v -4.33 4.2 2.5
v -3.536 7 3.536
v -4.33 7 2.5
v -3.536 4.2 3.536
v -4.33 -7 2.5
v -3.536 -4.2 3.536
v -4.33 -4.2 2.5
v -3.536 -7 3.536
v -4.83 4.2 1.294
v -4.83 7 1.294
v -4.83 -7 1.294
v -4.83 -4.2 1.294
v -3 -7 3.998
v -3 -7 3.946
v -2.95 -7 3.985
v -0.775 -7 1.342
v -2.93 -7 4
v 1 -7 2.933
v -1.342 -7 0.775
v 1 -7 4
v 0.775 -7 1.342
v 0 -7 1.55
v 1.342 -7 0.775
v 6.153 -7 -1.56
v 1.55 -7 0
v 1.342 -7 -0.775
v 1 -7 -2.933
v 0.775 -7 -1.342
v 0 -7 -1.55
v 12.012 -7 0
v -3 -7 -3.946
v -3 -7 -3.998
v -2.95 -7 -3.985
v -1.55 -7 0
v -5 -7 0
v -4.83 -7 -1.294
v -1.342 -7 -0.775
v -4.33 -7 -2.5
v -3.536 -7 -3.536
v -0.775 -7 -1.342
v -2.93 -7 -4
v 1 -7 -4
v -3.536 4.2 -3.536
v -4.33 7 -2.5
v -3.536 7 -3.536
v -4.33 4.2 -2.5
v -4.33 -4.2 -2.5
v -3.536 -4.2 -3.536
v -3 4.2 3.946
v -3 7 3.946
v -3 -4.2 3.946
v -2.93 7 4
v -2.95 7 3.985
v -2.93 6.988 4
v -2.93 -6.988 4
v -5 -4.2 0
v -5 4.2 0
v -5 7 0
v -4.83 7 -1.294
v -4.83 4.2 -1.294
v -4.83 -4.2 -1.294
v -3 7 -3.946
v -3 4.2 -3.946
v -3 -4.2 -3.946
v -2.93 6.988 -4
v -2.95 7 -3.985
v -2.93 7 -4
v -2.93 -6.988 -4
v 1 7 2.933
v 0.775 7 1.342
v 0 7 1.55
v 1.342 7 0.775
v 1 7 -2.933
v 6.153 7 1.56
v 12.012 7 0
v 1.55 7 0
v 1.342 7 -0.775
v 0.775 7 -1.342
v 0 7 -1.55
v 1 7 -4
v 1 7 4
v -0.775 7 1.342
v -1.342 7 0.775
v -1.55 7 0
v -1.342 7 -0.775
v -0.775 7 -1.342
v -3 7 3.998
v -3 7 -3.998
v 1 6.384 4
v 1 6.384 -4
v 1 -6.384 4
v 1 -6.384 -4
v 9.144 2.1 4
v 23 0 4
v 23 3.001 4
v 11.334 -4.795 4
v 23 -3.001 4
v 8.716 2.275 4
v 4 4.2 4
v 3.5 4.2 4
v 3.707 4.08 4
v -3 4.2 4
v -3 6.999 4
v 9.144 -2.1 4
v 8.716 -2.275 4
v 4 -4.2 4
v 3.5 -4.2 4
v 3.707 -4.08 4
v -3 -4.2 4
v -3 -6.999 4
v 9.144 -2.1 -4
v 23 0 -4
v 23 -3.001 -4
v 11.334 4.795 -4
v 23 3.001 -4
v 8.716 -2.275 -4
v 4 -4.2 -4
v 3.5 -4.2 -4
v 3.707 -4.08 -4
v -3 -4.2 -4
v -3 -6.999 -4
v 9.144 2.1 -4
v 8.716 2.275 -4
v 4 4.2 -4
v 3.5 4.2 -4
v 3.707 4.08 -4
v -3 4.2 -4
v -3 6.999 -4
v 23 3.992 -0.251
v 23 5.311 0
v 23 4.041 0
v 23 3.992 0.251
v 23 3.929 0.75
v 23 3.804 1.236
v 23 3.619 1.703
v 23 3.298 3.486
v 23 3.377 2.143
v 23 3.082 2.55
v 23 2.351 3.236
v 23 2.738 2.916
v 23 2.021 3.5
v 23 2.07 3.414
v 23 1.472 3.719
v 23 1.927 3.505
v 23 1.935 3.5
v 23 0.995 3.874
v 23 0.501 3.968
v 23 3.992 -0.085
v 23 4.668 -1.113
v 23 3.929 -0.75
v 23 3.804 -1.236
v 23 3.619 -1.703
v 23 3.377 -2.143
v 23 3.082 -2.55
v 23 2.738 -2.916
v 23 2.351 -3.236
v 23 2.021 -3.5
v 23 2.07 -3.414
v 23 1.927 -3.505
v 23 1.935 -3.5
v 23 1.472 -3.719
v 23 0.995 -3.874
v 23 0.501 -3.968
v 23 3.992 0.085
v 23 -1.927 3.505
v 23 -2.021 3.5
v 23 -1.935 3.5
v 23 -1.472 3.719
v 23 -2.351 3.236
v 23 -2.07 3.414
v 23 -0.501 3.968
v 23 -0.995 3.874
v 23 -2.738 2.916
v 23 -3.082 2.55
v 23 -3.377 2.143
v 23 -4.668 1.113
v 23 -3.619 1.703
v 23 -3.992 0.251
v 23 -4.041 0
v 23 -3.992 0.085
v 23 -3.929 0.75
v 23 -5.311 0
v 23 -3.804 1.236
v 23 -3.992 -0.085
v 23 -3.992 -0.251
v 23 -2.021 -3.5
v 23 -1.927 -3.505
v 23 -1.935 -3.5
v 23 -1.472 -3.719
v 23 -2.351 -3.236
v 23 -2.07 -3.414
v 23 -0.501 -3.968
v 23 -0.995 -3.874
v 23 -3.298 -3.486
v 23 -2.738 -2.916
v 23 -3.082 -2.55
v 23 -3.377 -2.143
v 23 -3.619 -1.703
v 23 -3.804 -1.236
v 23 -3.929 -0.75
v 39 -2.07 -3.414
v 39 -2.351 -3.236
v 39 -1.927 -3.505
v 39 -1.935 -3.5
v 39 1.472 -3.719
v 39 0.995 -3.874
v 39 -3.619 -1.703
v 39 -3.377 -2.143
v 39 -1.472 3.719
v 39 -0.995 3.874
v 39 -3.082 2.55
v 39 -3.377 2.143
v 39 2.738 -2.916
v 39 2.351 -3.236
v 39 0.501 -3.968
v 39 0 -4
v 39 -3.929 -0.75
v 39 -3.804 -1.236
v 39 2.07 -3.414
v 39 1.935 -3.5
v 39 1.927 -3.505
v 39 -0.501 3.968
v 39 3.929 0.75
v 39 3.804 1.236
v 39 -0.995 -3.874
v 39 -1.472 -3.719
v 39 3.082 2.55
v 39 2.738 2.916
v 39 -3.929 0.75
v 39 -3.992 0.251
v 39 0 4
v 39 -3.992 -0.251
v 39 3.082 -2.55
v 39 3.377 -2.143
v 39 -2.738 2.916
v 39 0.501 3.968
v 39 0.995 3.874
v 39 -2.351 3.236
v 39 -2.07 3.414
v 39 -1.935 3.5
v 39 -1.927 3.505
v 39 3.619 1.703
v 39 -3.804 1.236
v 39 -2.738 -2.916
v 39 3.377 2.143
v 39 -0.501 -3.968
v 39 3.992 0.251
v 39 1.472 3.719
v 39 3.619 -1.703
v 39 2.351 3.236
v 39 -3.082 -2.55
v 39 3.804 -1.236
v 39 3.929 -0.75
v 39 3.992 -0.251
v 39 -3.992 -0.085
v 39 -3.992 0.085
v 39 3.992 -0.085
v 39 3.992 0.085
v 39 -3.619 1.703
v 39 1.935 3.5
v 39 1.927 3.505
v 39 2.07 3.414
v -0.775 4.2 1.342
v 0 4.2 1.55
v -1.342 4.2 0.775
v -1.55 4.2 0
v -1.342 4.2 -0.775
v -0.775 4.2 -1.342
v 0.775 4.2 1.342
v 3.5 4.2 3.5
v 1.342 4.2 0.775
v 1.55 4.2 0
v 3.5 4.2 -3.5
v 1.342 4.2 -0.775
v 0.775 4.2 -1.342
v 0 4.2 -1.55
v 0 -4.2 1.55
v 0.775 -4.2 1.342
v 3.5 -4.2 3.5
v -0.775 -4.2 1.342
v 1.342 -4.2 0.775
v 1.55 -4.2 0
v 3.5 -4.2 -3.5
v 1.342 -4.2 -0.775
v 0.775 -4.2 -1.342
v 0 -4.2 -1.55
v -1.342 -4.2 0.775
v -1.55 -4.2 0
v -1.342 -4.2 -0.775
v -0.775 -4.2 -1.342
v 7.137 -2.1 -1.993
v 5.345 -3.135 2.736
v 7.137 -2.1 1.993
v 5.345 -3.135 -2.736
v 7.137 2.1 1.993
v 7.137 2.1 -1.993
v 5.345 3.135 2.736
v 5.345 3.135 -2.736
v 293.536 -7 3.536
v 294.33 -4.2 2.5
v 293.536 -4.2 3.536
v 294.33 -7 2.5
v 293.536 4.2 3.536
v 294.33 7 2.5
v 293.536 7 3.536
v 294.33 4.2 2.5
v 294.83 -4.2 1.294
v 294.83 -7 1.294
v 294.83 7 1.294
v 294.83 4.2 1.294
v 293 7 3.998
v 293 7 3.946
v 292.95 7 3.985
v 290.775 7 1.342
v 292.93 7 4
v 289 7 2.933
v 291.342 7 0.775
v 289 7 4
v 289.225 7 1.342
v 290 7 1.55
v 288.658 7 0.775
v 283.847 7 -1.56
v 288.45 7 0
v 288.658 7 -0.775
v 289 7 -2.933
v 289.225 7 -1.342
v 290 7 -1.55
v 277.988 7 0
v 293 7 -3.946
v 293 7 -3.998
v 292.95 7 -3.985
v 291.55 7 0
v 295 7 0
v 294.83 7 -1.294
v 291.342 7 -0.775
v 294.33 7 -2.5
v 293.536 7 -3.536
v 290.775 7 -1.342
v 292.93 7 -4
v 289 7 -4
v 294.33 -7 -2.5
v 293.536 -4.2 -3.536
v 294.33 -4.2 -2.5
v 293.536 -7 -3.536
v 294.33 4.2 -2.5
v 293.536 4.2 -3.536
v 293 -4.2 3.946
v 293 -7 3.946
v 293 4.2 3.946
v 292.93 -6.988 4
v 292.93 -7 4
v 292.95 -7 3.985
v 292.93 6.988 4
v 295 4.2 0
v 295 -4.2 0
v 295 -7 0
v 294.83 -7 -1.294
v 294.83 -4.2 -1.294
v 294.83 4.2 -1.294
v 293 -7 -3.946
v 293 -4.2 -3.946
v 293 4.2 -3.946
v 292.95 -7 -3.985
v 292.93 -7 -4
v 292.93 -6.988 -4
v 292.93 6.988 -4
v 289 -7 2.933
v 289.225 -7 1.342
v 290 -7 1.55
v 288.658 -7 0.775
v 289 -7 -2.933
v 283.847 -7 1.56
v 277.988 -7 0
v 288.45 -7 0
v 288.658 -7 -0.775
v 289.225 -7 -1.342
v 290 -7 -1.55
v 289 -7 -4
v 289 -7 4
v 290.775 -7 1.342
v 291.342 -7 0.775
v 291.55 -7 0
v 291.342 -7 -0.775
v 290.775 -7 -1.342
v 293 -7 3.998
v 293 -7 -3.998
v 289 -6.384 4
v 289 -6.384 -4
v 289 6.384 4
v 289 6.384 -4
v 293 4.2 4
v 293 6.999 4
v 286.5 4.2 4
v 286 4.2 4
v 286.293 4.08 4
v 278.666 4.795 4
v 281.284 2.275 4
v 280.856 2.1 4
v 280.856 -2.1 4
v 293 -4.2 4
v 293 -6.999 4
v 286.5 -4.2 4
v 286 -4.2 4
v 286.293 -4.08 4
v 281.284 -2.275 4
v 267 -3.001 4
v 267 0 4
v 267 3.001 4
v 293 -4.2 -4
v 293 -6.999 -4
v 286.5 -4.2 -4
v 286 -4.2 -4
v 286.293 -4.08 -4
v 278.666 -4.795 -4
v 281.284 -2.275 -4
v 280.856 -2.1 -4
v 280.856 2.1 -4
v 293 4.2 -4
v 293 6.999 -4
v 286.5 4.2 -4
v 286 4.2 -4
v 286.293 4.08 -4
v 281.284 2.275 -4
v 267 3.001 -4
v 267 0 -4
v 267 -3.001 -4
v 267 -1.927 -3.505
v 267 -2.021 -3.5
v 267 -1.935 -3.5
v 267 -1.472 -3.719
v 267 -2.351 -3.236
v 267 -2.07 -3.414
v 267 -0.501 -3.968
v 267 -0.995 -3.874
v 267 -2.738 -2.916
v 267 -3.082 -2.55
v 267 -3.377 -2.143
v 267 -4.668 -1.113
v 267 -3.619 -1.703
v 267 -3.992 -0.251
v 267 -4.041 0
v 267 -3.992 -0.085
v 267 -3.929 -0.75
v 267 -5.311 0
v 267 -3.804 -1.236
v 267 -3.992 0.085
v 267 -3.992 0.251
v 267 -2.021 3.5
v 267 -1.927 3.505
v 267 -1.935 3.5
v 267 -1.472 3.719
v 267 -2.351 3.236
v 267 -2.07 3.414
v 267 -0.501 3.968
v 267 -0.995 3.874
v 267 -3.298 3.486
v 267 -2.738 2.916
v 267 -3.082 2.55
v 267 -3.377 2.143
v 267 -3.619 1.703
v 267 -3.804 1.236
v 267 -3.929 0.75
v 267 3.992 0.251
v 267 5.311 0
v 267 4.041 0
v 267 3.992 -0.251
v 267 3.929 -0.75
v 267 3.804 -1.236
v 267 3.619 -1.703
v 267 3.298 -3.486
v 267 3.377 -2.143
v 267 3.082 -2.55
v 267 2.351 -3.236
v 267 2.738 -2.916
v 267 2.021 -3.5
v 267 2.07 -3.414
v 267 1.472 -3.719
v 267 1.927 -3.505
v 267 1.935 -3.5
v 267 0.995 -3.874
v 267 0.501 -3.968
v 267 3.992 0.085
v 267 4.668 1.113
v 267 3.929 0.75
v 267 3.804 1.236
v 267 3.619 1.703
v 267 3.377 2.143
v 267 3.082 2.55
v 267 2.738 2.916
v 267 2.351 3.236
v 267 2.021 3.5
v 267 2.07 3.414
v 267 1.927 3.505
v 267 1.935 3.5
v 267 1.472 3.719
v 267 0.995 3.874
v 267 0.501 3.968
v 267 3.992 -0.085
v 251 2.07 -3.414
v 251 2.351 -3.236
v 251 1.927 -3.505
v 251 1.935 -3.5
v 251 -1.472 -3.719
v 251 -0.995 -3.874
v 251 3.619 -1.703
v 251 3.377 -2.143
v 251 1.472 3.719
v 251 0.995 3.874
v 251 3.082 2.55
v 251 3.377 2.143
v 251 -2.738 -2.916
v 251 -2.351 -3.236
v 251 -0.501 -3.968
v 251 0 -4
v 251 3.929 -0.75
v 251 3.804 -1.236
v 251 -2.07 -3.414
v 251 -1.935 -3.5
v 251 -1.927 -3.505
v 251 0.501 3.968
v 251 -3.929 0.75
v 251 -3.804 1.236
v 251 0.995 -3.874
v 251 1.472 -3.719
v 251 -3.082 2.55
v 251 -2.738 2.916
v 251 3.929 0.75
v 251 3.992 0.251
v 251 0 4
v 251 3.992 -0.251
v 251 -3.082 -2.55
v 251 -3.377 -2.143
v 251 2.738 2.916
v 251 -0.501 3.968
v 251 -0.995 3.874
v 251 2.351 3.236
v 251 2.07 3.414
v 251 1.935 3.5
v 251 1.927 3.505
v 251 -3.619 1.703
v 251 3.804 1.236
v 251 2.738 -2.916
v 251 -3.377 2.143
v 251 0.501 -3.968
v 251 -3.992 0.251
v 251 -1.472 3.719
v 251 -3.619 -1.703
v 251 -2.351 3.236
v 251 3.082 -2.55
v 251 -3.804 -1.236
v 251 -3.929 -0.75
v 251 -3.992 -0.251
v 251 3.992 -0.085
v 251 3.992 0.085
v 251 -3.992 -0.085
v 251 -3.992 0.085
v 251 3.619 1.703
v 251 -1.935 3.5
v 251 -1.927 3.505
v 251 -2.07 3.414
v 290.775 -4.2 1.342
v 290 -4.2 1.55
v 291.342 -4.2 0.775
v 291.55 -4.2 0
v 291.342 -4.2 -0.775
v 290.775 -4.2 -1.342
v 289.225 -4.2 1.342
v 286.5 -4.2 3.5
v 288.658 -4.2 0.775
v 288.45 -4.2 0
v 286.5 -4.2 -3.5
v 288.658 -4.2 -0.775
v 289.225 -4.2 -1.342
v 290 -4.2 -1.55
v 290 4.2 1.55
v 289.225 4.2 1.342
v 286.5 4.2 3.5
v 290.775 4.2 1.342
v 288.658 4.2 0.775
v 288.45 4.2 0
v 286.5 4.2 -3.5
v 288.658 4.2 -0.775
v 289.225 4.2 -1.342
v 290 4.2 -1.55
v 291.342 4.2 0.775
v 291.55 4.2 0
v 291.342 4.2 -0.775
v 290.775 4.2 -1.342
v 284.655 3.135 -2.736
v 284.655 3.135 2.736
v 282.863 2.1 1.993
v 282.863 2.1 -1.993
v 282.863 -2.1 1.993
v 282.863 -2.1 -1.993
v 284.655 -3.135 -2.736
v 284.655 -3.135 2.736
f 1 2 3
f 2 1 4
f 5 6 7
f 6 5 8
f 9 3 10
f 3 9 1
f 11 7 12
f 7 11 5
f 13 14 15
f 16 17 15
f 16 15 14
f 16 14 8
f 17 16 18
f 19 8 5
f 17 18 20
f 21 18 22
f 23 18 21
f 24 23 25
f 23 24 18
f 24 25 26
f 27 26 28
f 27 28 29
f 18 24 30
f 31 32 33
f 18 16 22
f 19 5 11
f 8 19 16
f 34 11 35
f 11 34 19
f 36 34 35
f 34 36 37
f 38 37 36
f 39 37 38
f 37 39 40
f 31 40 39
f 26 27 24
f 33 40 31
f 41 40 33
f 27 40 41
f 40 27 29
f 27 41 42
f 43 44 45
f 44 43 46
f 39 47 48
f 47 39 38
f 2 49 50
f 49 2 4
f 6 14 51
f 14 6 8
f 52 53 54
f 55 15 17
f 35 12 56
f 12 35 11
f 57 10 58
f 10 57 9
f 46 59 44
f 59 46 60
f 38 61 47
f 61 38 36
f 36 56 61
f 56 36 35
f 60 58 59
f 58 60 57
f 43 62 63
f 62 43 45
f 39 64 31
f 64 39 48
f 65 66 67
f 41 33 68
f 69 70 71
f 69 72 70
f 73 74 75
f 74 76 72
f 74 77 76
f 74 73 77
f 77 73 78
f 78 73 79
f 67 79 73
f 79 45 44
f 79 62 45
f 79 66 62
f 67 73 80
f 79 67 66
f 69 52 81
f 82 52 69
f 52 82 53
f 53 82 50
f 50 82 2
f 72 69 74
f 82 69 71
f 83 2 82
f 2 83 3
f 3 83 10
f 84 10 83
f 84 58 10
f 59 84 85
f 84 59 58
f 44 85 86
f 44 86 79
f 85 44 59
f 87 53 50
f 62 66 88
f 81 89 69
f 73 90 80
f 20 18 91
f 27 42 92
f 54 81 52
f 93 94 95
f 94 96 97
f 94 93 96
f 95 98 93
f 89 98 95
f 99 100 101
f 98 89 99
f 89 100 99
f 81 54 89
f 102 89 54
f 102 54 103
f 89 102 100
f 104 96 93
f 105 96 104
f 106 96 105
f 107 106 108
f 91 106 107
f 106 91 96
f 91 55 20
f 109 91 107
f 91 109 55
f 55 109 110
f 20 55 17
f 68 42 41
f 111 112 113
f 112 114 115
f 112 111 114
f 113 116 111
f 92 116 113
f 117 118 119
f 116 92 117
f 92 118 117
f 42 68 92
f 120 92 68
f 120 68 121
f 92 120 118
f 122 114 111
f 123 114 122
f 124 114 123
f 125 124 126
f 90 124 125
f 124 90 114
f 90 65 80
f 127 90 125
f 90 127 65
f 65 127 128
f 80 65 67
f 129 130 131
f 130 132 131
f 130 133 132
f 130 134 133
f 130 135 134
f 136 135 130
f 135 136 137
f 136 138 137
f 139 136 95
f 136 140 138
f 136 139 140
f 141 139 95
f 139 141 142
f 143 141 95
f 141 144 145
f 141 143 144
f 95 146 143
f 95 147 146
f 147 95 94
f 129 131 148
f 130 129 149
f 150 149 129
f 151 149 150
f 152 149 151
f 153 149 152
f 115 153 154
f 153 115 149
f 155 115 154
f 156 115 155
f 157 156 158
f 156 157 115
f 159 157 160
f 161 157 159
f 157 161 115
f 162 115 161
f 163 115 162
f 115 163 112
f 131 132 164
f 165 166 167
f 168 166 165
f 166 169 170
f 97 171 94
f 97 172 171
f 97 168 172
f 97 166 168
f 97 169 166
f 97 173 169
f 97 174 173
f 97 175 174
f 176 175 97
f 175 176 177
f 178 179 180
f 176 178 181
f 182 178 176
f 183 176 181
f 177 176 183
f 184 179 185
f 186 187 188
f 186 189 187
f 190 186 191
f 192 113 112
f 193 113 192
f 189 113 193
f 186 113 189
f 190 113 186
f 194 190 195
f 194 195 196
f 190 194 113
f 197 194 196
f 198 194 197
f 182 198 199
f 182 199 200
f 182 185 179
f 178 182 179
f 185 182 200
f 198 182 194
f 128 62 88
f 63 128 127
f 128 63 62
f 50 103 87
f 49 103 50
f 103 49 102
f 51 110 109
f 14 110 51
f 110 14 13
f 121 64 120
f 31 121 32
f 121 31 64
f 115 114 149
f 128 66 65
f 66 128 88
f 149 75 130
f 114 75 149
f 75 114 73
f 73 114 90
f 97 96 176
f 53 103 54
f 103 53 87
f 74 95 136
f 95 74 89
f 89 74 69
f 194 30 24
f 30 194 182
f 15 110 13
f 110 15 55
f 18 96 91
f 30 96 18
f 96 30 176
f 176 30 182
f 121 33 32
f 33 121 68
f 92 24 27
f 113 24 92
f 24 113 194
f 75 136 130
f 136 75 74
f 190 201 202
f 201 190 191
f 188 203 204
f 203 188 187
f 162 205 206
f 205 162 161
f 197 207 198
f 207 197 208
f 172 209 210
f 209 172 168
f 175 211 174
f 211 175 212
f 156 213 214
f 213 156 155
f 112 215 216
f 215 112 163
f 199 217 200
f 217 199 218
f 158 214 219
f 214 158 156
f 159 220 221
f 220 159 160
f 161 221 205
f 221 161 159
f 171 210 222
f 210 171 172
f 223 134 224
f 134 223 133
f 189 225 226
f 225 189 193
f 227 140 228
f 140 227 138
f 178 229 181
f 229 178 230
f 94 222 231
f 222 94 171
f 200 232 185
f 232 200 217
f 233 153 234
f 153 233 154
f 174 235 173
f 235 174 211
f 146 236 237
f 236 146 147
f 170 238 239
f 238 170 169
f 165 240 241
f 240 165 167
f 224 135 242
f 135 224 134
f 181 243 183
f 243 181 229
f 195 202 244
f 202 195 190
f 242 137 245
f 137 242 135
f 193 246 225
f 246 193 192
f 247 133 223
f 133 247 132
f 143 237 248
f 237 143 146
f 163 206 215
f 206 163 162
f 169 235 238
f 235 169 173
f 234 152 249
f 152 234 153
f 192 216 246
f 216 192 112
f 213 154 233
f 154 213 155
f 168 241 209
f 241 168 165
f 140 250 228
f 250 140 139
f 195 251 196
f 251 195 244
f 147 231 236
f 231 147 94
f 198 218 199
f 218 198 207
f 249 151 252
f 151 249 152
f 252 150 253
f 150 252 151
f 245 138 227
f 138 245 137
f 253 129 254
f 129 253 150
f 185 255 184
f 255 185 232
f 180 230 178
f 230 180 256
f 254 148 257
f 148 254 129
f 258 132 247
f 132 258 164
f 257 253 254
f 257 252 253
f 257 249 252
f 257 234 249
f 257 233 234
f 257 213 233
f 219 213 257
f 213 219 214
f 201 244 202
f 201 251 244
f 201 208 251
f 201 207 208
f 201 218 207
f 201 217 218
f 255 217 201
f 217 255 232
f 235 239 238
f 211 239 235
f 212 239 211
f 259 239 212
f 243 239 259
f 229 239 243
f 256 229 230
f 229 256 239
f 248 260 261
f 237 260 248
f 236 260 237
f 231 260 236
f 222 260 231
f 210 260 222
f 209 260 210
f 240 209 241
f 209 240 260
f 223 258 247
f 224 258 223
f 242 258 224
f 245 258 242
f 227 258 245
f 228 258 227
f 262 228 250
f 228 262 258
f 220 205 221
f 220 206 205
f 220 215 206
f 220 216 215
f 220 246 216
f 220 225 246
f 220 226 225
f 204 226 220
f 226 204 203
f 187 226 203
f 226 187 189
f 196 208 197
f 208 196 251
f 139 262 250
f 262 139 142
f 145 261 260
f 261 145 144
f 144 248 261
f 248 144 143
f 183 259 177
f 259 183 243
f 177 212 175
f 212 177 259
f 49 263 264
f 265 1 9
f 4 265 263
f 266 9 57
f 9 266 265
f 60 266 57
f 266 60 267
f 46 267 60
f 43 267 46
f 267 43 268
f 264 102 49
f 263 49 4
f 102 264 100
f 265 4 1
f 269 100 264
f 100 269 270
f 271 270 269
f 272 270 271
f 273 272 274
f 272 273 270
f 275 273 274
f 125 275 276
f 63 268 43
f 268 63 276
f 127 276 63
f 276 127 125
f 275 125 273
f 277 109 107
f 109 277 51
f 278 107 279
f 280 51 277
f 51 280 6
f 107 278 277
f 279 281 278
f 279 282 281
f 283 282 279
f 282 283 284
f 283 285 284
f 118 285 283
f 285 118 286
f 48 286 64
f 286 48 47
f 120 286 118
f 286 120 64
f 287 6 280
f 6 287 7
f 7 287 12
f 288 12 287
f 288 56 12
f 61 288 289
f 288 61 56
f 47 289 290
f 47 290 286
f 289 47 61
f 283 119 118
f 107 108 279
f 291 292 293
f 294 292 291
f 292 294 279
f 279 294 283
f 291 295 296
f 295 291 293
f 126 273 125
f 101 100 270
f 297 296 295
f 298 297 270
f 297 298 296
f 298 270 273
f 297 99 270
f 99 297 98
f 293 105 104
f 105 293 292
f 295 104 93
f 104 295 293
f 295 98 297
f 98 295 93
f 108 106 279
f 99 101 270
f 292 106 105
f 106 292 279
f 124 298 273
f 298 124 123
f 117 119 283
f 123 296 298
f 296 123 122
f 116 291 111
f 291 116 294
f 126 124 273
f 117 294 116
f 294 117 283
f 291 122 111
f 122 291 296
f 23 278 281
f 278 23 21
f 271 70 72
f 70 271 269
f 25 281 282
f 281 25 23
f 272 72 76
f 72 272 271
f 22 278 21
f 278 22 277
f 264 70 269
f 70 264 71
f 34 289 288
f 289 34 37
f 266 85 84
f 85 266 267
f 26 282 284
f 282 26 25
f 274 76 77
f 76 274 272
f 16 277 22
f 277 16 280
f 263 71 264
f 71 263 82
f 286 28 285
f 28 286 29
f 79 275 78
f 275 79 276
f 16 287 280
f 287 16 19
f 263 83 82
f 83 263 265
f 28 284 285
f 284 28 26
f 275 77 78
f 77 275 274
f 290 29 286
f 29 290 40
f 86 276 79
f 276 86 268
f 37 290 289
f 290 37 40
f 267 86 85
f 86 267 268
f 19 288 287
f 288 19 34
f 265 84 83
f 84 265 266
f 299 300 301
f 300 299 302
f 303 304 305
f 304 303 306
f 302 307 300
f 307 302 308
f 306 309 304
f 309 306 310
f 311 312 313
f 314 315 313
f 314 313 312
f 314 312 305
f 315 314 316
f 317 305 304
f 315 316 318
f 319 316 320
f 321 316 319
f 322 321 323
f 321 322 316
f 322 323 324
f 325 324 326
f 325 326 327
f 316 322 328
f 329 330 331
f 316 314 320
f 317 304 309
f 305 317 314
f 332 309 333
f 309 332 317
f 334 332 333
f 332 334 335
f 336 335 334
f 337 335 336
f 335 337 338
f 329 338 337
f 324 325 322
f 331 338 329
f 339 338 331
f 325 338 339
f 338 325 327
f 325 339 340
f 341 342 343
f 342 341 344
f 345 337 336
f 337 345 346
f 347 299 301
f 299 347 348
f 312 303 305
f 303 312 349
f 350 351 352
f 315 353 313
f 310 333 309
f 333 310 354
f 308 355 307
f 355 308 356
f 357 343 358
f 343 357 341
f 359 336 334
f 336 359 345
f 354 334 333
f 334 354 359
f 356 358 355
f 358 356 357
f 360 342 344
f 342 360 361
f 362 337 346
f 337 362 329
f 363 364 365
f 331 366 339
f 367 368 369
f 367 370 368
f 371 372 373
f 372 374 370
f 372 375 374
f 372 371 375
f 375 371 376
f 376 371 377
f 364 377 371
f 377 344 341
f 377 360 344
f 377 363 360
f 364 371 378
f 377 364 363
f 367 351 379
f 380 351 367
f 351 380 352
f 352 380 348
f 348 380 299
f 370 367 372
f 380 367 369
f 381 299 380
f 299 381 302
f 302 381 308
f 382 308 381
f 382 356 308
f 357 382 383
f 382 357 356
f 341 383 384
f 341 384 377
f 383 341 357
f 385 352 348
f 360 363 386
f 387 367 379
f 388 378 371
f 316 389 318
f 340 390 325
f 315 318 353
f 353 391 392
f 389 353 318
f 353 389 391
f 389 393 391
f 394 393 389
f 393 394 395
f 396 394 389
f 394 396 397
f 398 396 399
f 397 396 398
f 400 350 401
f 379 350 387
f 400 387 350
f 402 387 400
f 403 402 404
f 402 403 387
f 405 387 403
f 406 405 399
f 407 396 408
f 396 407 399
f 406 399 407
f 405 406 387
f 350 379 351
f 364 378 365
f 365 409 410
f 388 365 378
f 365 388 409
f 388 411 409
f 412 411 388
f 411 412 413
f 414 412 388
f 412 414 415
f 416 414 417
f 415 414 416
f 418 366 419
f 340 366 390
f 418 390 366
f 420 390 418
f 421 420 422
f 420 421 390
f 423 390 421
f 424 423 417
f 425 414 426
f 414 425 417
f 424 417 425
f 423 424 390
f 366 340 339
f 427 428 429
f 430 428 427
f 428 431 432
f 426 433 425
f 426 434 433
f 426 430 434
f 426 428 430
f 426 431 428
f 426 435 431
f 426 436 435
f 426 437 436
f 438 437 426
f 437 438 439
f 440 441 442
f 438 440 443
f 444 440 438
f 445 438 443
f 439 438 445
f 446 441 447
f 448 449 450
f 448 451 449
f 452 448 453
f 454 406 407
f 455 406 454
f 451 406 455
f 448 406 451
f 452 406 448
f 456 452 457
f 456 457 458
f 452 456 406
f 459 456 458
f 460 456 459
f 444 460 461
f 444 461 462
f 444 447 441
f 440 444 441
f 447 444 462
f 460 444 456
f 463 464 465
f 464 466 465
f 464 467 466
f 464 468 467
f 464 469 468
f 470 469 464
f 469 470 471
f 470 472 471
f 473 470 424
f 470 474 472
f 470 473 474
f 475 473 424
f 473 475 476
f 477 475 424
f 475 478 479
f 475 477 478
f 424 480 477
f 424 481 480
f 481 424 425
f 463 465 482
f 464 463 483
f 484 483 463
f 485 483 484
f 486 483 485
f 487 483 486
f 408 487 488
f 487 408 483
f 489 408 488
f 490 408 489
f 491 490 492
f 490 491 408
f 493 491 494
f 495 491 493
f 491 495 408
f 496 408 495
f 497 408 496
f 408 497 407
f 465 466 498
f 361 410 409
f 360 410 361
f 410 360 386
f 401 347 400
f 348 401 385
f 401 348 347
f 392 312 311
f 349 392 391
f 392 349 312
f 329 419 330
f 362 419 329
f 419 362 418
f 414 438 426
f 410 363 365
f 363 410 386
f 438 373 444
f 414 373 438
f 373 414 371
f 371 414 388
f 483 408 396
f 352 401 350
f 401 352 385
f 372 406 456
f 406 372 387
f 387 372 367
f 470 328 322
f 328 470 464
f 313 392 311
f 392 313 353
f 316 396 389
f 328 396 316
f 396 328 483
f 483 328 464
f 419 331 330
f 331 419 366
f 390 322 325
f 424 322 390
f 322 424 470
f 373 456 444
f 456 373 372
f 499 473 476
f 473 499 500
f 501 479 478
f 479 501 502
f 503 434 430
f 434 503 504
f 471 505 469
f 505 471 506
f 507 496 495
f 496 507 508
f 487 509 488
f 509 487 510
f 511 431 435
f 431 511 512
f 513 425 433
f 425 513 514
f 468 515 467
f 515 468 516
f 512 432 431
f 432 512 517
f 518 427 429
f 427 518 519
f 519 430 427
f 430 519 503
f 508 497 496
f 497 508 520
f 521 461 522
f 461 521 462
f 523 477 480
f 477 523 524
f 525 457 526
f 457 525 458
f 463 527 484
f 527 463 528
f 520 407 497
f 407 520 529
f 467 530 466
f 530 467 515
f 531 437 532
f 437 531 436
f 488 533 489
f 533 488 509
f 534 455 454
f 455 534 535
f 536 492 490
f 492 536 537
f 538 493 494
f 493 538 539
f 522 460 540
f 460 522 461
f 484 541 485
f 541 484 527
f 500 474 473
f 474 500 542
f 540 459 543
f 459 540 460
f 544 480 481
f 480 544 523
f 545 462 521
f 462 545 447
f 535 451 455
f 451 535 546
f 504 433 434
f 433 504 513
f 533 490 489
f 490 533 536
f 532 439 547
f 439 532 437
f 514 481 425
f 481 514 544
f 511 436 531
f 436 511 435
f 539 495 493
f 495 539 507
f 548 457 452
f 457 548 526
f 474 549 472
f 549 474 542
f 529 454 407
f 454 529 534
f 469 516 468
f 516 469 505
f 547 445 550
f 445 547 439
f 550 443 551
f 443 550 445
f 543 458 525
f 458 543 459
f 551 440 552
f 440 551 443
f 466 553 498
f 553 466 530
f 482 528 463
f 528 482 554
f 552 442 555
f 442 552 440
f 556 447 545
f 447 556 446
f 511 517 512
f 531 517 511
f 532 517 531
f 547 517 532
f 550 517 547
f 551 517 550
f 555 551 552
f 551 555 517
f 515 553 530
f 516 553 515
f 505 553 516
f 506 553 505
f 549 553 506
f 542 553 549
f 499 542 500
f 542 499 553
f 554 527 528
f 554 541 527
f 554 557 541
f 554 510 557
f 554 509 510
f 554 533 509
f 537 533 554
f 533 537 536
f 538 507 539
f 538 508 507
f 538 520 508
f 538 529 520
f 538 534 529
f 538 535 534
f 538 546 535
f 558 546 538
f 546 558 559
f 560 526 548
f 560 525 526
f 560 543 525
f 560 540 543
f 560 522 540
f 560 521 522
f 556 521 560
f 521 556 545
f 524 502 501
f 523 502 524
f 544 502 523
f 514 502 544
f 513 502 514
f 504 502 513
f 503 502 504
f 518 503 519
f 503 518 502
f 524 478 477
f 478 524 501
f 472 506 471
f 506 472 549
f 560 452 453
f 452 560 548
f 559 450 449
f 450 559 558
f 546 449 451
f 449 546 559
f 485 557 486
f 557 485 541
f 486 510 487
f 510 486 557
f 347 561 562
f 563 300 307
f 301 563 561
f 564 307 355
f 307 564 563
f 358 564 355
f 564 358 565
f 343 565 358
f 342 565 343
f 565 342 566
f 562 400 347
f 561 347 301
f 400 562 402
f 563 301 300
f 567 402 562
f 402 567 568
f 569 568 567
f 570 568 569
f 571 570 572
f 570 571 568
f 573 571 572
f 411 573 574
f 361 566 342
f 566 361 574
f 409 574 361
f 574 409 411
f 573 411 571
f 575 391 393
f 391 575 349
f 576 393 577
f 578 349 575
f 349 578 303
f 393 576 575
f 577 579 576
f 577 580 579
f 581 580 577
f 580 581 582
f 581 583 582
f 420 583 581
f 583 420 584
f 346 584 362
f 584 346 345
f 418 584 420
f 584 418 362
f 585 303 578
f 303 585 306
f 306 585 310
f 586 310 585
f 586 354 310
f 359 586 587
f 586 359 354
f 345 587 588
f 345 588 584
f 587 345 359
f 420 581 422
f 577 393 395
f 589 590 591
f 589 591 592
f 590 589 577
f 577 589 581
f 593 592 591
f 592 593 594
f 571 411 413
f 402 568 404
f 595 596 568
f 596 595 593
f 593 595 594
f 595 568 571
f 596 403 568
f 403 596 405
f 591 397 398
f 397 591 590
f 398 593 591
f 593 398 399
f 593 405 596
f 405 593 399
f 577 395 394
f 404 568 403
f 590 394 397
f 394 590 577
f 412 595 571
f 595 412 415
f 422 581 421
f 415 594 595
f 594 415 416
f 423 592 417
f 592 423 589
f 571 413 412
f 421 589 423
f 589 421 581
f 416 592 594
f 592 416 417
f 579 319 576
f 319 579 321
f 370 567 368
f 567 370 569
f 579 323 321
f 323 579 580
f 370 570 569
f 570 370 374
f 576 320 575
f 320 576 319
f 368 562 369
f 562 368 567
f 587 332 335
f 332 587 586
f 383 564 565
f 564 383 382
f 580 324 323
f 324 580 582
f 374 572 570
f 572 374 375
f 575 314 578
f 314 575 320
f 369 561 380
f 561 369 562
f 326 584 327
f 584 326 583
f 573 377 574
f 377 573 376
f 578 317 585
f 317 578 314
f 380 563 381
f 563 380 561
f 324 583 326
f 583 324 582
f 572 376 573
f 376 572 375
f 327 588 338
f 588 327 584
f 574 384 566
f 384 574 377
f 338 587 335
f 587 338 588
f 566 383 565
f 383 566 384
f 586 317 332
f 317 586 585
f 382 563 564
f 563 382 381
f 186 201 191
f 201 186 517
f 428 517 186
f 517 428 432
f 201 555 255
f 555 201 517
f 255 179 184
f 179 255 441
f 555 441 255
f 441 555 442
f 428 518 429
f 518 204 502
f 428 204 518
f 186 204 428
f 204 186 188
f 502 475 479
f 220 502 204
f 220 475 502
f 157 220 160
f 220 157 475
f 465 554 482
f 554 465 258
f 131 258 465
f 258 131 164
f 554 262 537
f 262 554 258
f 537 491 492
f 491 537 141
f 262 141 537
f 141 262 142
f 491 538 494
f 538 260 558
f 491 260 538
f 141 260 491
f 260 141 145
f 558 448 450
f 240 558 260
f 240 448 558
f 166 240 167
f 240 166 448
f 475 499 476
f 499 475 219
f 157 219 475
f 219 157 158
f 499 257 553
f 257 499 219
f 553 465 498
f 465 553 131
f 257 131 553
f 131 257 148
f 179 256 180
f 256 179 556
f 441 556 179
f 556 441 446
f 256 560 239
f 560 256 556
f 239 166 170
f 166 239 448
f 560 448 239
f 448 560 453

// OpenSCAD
// file: jaws.scad
h = 8;
r = h/2 / cos(30);

module jaws() {
  difference() {
    union() {
      intersection () {
        rotate([90, 0, 0]) cylinder(r=5, h=14, center=true, $fn=24);
        translate([-4, 0, 0]) cube([10, 14, h], center=true);
      }
      intersection() {
        translate([10, 0, 0]) cube([26, 14, h], center=true);
        translate([10, 0, 0]) rotate([0, 90, 0]) rotate([0, 0, 30])
          cylinder(r1=10, r2=r, h=35, center=true, $fn=6);
      }
      translate([19, 0, 0]) rotate([0, 90, 0])
      cylinder(r=4, h=40, center=true, $fn=50);
    }
    translate([-1.5, 0, 0]) cube([10, 8.4, 10], center=true);
    translate([3.5, 0, 0]) rotate([0, 0, 30])
      cylinder(r=4.2, h=10, center=true, $fn=6);
    translate([4, 0, 4]) rotate([0, 45, 0])
      rotate([0, 0, 30]) cylinder(r=4.2, h=8, center=true, $fn=6);
    translate([4, 0, -4]) rotate([0, -45, 0])
      rotate([0, 0, 30]) cylinder(r=4.2, h=8, center=true, $fn=6);
    rotate([90, 0, 0]) cylinder(r=1.55, h=40, center=true, $fn=12);
  }
}

translate([0, 0, h/2]) jaws();
// file: configuration.scad
motor_end_height=50;
idler_end_height=28;
carriage_height=24;
platform_thickness=8;
bed_thickness=12;
pcb_thickness=2;
rod_length=290;
smooth_rod_length=1000;
smooth_rod_diameter=12;
smooth_rod_distance=80;
sandwich_smooth_rod_mounting_screw_distance=12;
tower_radius = 200;
platform_hinge_offset=33;
carriage_hinge_offset=22;
plywood_thickness=9;
// main file
include <configuration.scad>
use <jaws.scad>

l = rod_length;
h = 7;
r = h/2 / cos(30);

// Wipe nozzle after long travel moves.
module collar() {
  difference() {
    cube([4, 20, h], center=true);
    cube([2, 18, h+1], center=true);
    rotate([0, 90, 0]) rotate([0, 0, 30])
      cylinder(r=5, h=5, center=true, $fn=6);
  }
}

// Small hollow cube.
module cubicle() {
  difference() {
    cube([6, 6, h], center=true);
    cube([4, 4, h+1], center=true);
  }
}

// Nozzle wipers.
module wipers() {
  translate([l/2+2, 0, 0]) cubicle();
  translate([-l/2-2, 0, 0]) cubicle();
  translate([l/2-25, 0, 0]) collar();
  translate([-l/2+25, 0, 0]) collar();
}

// Rod with two Y shaped rod ends.
module rod(l) {
  translate([l/2,0,0])
  union() {
    translate([-l/2, 0, 0]) jaws();
    translate([l/2, 0, 0]) rotate([0, 0, 180]) jaws();
    rotate([0, 90, 0]) rotate([0, 0, 30])
      cylinder(r=r, h=l-18, center=true, $fn=6);
  }
}

module printable_rod(l)
{
	// Print platform.
	bed = 8*25.4; // 8x8 inches.
	% translate([0, 0, -1]) cube([bed, bed, 2], center=true);

	rotate(45)
	translate([-l/2,0,h/2])
	rod(l=l);

	// If your nozzle doesn't ooze at all, you can comment the next line out.
	translate([0,0,h/2])
	rotate(45)
	wipers();
}

rod(l=l);
//translate([0,20,0])rotate([0,90,0])cylinder(r=2,h=l);
//printable_rod(l=l);
